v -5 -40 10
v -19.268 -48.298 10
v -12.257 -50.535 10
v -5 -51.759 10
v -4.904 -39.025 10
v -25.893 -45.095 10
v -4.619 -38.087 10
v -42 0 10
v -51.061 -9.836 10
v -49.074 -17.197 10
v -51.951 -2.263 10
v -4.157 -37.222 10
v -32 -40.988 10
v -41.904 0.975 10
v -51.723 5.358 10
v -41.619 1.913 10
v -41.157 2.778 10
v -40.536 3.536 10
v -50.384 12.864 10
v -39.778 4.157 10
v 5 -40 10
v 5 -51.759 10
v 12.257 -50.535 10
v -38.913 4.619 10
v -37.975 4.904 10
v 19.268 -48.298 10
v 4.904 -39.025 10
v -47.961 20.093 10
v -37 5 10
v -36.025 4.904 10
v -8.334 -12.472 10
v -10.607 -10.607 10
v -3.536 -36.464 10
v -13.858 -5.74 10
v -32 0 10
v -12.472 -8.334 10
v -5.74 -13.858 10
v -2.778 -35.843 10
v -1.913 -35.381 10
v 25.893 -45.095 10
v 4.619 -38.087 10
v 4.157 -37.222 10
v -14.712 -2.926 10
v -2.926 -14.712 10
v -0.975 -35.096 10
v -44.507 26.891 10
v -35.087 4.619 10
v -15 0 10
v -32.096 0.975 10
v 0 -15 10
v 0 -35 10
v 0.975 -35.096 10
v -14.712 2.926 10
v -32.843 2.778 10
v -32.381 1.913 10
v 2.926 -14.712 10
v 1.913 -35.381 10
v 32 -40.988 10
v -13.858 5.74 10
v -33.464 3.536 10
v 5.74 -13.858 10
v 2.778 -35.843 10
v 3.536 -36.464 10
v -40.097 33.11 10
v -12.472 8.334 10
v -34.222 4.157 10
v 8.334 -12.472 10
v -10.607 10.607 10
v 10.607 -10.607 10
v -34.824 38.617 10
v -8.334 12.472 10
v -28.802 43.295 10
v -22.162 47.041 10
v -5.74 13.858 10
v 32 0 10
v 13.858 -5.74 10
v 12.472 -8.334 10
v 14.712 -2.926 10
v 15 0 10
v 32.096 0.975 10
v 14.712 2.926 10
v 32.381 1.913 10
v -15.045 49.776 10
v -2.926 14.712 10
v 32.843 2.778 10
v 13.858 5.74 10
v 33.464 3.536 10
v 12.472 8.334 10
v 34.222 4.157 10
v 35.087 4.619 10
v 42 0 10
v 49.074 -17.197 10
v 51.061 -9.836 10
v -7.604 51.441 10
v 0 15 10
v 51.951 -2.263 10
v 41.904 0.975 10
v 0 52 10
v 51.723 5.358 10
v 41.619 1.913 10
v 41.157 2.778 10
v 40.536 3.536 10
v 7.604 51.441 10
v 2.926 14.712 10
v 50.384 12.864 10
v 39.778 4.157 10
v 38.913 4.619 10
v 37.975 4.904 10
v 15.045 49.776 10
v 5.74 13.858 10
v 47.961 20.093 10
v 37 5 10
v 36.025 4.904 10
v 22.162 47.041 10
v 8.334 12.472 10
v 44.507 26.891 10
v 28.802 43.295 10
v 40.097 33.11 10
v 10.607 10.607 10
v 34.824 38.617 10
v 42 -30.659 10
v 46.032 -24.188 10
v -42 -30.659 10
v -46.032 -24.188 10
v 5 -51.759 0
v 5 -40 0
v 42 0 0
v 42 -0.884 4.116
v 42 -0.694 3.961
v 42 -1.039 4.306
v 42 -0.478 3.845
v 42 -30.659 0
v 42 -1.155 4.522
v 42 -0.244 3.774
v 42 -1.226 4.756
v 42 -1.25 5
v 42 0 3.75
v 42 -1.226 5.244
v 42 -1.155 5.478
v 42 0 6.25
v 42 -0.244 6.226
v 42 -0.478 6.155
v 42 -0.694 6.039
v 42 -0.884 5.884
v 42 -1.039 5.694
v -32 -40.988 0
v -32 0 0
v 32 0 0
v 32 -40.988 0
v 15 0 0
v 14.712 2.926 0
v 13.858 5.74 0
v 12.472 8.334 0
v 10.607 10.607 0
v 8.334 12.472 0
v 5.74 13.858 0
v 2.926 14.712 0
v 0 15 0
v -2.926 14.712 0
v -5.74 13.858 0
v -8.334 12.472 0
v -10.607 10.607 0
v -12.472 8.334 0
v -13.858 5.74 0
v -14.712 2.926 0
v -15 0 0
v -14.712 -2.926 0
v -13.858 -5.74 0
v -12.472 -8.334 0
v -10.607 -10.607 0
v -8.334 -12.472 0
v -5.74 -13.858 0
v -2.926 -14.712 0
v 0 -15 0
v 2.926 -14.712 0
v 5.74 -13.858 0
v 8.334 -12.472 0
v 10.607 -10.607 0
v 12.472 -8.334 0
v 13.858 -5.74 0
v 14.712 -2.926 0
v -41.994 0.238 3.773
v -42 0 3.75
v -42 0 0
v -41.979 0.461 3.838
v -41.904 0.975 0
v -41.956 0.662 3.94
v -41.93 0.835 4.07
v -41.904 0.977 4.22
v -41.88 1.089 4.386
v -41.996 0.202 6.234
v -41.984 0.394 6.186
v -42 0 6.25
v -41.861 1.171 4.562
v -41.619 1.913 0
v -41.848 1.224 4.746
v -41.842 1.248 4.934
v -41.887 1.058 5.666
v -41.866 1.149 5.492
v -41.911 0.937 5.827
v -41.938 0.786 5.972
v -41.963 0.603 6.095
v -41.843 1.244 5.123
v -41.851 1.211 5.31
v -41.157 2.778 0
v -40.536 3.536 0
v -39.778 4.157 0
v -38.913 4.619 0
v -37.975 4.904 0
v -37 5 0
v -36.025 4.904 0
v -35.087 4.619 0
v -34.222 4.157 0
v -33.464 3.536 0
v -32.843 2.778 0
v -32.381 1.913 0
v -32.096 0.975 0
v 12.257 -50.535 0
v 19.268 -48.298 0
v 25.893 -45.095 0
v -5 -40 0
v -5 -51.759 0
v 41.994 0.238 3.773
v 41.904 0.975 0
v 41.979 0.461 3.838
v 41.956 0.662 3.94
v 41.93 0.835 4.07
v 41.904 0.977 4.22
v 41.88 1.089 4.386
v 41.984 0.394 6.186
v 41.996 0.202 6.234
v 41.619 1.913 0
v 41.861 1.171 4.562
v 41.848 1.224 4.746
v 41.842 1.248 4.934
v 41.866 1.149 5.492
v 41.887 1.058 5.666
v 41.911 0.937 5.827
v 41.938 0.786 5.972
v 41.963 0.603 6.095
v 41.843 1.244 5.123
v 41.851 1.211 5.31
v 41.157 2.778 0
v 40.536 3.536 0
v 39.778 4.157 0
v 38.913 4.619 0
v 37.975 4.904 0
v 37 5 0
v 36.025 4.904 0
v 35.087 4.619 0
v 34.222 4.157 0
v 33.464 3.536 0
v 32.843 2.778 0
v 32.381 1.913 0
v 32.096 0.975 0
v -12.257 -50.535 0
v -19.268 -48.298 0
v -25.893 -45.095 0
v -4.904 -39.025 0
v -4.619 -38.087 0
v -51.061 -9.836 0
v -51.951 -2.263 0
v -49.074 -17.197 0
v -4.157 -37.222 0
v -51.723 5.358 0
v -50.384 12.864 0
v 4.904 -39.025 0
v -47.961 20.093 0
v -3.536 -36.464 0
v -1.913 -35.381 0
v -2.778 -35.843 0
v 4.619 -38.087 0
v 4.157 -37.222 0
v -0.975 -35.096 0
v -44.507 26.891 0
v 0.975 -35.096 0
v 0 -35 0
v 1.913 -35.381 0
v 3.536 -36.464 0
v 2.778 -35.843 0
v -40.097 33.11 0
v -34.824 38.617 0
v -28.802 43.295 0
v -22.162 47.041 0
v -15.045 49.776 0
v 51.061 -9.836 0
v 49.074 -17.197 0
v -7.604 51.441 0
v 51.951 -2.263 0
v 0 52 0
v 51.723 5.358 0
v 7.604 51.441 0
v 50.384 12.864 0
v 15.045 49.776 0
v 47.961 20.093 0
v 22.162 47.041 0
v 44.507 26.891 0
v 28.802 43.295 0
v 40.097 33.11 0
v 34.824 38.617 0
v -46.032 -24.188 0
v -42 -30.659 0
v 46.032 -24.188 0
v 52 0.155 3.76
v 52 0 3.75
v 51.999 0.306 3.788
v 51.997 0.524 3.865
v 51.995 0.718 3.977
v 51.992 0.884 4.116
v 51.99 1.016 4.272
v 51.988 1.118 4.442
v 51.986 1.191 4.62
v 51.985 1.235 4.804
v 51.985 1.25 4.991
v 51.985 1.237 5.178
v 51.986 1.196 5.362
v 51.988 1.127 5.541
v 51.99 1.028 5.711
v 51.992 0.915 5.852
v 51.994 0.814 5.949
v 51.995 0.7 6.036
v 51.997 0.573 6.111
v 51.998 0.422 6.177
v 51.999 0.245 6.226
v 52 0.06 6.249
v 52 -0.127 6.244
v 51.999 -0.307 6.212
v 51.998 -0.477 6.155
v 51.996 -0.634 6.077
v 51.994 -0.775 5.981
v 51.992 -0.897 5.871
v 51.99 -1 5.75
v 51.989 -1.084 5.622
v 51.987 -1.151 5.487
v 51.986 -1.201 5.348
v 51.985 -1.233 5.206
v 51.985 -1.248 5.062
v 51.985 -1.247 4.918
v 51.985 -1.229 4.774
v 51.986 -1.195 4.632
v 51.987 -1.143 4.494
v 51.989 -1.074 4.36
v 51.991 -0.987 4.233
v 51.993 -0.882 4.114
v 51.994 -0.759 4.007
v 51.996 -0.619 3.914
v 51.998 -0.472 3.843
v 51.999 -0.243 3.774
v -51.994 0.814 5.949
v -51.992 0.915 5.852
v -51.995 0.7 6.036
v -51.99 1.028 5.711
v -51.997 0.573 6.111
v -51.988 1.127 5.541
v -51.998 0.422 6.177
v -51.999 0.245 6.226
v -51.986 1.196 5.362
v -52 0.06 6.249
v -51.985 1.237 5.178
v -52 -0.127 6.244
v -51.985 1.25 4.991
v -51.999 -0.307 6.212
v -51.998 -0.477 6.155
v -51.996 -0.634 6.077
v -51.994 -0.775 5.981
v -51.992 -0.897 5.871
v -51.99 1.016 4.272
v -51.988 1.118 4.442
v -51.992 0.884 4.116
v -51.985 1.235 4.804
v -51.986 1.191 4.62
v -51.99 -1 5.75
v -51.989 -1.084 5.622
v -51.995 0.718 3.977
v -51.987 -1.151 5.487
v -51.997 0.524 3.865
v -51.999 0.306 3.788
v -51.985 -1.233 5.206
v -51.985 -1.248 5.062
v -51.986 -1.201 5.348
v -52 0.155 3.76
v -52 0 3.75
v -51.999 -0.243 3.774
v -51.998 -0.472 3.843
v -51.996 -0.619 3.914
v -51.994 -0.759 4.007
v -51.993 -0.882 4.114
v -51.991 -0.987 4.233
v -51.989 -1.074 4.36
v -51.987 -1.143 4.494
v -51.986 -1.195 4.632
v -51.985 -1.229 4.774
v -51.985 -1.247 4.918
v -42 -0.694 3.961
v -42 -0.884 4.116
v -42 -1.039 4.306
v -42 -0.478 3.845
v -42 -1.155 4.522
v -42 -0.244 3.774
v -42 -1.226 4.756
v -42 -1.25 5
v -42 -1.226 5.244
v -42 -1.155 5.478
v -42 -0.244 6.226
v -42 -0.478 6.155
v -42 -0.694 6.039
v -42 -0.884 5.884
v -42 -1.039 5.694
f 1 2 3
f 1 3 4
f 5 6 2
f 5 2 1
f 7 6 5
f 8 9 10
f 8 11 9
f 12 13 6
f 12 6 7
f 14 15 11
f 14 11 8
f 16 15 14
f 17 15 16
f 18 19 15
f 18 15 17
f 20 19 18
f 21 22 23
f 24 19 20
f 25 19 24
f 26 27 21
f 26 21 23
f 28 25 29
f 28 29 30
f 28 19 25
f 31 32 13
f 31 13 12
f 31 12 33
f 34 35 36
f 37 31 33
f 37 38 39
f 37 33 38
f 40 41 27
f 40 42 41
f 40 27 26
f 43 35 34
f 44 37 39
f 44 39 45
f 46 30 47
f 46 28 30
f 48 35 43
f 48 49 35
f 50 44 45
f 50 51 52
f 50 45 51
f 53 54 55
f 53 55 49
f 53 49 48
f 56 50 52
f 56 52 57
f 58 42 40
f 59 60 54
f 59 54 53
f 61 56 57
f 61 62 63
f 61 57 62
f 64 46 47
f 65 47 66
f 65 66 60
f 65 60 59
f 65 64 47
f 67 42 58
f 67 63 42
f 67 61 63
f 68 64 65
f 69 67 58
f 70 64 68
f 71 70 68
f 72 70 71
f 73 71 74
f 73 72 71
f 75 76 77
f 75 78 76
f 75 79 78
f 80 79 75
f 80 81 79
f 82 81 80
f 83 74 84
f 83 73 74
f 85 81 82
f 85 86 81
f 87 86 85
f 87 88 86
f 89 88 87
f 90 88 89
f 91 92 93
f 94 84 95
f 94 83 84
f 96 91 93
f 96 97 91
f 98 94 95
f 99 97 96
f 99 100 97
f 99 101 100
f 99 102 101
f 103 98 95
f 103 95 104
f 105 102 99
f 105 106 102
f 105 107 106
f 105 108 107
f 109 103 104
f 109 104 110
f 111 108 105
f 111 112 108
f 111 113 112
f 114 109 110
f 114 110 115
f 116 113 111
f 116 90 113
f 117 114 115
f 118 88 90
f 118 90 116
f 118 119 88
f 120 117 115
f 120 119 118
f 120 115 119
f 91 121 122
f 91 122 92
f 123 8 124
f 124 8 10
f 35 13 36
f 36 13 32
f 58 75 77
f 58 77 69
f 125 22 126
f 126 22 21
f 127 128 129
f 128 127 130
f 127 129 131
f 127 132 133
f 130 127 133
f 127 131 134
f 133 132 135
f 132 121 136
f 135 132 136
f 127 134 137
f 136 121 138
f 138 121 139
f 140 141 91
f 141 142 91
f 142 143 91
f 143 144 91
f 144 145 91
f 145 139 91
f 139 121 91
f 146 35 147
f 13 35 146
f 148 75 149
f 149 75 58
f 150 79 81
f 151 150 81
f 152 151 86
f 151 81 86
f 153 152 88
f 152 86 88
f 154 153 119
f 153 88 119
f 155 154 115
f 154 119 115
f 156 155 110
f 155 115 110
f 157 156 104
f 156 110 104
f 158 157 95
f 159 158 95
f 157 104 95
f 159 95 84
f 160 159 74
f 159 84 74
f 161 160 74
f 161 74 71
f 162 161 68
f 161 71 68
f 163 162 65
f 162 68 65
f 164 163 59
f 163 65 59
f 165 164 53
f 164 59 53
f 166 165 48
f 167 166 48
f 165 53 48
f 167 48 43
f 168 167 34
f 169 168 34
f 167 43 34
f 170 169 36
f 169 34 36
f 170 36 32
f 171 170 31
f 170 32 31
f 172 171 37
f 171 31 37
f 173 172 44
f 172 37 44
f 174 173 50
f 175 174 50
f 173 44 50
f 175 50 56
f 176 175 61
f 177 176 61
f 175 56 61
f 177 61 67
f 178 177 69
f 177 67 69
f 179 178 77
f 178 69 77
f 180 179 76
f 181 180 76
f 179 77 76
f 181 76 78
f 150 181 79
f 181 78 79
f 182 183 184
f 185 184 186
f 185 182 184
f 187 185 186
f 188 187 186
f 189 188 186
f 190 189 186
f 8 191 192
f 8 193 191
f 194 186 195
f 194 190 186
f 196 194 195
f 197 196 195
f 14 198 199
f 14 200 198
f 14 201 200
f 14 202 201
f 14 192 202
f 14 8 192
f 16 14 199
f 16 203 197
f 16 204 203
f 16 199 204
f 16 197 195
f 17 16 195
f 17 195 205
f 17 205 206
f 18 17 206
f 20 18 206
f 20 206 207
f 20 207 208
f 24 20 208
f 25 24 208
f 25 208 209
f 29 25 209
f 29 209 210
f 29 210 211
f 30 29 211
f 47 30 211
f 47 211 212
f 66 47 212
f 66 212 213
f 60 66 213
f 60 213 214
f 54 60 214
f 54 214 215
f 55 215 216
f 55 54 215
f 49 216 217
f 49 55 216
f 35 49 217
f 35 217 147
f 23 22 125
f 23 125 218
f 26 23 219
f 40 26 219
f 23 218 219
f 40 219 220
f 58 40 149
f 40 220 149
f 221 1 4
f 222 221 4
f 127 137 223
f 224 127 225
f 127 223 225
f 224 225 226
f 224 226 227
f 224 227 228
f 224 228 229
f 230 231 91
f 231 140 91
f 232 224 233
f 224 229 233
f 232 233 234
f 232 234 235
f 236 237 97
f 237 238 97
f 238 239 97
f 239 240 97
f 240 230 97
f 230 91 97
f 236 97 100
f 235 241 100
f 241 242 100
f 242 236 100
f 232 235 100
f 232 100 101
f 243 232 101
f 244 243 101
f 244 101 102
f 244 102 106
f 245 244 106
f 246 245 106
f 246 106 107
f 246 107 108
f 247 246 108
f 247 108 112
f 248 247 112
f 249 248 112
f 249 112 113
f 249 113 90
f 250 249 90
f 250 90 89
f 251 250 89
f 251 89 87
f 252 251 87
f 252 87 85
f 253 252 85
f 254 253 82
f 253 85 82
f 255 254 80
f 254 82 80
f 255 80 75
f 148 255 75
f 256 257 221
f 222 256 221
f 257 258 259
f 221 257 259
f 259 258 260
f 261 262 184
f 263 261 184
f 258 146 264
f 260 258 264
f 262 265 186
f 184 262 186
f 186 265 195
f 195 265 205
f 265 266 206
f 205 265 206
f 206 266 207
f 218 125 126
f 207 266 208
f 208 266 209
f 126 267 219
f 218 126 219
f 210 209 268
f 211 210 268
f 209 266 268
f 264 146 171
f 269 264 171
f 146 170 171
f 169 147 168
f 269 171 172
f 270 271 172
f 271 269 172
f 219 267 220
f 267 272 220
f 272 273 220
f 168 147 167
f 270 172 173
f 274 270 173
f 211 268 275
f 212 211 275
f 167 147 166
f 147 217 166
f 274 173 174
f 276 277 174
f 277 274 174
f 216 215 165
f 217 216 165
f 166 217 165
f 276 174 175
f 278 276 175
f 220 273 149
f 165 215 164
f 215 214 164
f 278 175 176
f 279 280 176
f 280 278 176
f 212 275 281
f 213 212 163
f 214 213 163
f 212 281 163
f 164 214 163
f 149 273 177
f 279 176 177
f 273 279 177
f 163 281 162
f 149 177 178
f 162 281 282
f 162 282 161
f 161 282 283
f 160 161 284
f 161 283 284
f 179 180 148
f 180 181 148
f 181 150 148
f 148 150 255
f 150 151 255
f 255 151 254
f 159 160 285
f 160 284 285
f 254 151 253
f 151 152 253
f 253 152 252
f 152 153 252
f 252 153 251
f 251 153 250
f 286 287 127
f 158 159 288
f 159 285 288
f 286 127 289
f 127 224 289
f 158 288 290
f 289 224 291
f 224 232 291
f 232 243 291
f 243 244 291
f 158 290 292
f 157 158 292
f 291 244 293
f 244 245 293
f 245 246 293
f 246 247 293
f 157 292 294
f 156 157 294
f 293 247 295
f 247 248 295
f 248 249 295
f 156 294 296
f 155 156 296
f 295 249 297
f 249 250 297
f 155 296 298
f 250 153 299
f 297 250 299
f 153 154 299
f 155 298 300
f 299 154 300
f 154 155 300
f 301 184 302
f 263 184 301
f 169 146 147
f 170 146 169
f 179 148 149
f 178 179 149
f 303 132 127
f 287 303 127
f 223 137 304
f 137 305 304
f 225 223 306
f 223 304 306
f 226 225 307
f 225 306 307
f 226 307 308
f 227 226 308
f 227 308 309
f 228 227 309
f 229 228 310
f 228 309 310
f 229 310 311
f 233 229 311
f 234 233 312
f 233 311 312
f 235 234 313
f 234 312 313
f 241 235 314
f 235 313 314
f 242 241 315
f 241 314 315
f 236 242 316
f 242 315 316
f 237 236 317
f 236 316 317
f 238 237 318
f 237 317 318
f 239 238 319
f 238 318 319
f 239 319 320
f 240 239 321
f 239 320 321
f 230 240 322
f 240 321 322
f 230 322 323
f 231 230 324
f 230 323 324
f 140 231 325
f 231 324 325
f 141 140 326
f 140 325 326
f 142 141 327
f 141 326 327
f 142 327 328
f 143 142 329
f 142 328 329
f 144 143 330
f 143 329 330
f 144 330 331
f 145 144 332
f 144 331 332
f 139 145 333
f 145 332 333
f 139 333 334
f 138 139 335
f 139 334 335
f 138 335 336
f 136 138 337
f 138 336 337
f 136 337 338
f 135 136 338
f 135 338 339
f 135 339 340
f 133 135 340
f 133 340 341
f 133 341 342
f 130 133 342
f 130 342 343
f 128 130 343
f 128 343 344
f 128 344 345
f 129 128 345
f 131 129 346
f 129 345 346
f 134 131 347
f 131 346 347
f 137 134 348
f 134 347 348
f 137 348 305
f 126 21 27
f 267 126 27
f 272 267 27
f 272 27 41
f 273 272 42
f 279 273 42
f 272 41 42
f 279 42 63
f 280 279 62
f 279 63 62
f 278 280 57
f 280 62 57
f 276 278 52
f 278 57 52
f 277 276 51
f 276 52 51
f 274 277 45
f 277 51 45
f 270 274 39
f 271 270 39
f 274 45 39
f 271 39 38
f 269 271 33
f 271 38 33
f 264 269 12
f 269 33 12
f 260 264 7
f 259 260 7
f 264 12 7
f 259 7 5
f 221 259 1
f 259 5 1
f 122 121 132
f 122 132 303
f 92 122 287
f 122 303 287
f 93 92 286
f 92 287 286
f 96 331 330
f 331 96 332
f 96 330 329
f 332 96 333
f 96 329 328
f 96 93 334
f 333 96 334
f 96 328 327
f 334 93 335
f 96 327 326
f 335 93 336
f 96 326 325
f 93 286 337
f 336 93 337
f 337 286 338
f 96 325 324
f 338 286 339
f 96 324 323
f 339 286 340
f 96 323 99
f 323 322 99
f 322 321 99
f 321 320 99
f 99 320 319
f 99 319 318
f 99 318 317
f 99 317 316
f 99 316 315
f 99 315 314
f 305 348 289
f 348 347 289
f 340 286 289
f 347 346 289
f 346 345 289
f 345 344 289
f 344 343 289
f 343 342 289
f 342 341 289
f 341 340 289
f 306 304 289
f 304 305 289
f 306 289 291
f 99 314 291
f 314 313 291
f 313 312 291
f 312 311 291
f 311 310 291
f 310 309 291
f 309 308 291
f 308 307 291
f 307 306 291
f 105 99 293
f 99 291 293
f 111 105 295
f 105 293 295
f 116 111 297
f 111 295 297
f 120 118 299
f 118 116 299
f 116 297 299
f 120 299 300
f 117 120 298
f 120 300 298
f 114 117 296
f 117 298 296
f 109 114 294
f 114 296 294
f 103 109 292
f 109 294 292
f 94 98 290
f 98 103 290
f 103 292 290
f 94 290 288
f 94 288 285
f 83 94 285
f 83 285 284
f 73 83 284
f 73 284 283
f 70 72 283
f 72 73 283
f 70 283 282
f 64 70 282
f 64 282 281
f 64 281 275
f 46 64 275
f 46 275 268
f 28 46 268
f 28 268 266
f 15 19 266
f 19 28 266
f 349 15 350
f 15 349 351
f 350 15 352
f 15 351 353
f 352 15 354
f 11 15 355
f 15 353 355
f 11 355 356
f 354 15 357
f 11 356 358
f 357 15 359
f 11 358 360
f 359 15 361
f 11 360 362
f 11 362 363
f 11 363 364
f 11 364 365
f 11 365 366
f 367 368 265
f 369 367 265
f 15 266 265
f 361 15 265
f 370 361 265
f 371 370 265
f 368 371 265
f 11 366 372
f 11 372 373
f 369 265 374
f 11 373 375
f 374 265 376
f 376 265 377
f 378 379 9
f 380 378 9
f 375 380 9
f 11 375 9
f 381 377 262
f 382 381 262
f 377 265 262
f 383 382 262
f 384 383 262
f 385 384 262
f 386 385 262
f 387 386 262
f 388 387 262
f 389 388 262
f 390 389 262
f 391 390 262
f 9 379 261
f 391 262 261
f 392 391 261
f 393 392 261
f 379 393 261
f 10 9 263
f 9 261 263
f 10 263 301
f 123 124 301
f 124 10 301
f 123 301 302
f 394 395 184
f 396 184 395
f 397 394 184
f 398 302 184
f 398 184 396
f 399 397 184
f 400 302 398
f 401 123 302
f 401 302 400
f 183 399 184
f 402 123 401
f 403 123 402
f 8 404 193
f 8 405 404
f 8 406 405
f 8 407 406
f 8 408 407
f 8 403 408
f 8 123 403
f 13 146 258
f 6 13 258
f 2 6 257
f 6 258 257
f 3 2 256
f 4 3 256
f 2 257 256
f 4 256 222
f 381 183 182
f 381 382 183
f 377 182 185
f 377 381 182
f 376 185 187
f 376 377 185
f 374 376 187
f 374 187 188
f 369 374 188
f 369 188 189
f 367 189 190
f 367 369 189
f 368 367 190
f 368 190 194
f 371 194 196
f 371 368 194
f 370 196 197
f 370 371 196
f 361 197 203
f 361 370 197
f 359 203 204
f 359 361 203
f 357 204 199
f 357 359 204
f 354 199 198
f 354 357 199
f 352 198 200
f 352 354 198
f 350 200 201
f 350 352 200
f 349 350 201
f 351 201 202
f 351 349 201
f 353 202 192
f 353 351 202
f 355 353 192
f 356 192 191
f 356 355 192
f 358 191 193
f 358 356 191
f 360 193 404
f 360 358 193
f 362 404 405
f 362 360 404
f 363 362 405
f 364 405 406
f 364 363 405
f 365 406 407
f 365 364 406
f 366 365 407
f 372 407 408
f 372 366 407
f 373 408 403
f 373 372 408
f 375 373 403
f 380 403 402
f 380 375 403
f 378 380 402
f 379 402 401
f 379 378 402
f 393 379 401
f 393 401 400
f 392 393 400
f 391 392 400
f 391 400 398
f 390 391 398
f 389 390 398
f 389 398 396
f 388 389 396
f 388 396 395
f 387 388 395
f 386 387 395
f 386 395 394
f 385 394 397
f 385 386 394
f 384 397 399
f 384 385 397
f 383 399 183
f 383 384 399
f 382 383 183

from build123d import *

# Parameters (mm, degrees)
SKETCH1_R              = 52
BOSS_EXTRUDE1_DEPTH    = 10
CUT_EXTRUDE1_DEPTH     = 10
SKETCH3_R              = 15
CUT_EXTRUDE2_DEPTH     = 10
M3_TAPPED_HOLE3_REACH  = 118.705
M3_TAPPED_HOLE3_BORE_R = 1.25


with BuildPart() as part:
    # Sketch1 → Boss-Extrude1 (new body)
    with BuildSketch(Plane.XY):
        Circle(SKETCH1_R)
    extrude(amount=BOSS_EXTRUDE1_DEPTH)

    # Sketch2 → Cut-Extrude1 (cut)
    with BuildSketch(Plane.XY.offset(10)):
        with BuildLine():
            Line((32, 0), (32, -45))
            Line((32, -45), (42, -45))
            Line((42, -45), (42, 3.54e-07))
            ThreePointArc((42, 3.54e-07), (36.999999823, 5), (32, 0))
        make_face()
        with BuildLine():
            Line((-5, -39.999999646), (-5, -55))
            Line((-5, -55), (5, -55))
            Line((5, -55), (5, -40))
            ThreePointArc((5, -40), (1.77e-07, -35), (-5, -39.999999646))
        make_face()
        with BuildLine():
            Line((-32, -45), (-42, -45))
            Line((-42, -45), (-42, 3.54e-07))
            ThreePointArc((-42, 3.54e-07), (-36.999999823, 5), (-32, 0))
            Line((-32, 0), (-32, -45))
        make_face()
    extrude(amount=-CUT_EXTRUDE1_DEPTH, mode=Mode.SUBTRACT)

    # Sketch3 → Cut-Extrude2 (cut)
    with BuildSketch(Plane.XY.offset(10)):
        Circle(SKETCH3_R)
    extrude(amount=-CUT_EXTRUDE2_DEPTH, mode=Mode.SUBTRACT)

    # M3 Tapped Hole3 bore → M3 Tapped Hole3 (cut, up to next)
    with BuildSketch(Plane(origin=(52, 0, 0), x_dir=(0, 0, -1), z_dir=(1, 0, 0)), mode=Mode.PRIVATE) as m3_tapped_hole3_sk1:
        with Locations((-5, 1e-08)):
            Circle(M3_TAPPED_HOLE3_BORE_R)
    m3_tapped_hole3_tool1 = extrude(m3_tapped_hole3_sk1.sketch, amount=-M3_TAPPED_HOLE3_REACH, mode=Mode.PRIVATE) & part.part
    m3_tapped_hole3 = m3_tapped_hole3_tool1.solids().sort_by_distance((52, 0, 5))[0]
    add(m3_tapped_hole3, mode=Mode.SUBTRACT)

    # Mirror1: M3 Tapped Hole3 across plane
    add(m3_tapped_hole3.mirror(Plane(origin=(0, 0, 0), x_dir=(0, 0, 1), z_dir=(1, 0, 0))), mode=Mode.SUBTRACT)


solid = part.part
